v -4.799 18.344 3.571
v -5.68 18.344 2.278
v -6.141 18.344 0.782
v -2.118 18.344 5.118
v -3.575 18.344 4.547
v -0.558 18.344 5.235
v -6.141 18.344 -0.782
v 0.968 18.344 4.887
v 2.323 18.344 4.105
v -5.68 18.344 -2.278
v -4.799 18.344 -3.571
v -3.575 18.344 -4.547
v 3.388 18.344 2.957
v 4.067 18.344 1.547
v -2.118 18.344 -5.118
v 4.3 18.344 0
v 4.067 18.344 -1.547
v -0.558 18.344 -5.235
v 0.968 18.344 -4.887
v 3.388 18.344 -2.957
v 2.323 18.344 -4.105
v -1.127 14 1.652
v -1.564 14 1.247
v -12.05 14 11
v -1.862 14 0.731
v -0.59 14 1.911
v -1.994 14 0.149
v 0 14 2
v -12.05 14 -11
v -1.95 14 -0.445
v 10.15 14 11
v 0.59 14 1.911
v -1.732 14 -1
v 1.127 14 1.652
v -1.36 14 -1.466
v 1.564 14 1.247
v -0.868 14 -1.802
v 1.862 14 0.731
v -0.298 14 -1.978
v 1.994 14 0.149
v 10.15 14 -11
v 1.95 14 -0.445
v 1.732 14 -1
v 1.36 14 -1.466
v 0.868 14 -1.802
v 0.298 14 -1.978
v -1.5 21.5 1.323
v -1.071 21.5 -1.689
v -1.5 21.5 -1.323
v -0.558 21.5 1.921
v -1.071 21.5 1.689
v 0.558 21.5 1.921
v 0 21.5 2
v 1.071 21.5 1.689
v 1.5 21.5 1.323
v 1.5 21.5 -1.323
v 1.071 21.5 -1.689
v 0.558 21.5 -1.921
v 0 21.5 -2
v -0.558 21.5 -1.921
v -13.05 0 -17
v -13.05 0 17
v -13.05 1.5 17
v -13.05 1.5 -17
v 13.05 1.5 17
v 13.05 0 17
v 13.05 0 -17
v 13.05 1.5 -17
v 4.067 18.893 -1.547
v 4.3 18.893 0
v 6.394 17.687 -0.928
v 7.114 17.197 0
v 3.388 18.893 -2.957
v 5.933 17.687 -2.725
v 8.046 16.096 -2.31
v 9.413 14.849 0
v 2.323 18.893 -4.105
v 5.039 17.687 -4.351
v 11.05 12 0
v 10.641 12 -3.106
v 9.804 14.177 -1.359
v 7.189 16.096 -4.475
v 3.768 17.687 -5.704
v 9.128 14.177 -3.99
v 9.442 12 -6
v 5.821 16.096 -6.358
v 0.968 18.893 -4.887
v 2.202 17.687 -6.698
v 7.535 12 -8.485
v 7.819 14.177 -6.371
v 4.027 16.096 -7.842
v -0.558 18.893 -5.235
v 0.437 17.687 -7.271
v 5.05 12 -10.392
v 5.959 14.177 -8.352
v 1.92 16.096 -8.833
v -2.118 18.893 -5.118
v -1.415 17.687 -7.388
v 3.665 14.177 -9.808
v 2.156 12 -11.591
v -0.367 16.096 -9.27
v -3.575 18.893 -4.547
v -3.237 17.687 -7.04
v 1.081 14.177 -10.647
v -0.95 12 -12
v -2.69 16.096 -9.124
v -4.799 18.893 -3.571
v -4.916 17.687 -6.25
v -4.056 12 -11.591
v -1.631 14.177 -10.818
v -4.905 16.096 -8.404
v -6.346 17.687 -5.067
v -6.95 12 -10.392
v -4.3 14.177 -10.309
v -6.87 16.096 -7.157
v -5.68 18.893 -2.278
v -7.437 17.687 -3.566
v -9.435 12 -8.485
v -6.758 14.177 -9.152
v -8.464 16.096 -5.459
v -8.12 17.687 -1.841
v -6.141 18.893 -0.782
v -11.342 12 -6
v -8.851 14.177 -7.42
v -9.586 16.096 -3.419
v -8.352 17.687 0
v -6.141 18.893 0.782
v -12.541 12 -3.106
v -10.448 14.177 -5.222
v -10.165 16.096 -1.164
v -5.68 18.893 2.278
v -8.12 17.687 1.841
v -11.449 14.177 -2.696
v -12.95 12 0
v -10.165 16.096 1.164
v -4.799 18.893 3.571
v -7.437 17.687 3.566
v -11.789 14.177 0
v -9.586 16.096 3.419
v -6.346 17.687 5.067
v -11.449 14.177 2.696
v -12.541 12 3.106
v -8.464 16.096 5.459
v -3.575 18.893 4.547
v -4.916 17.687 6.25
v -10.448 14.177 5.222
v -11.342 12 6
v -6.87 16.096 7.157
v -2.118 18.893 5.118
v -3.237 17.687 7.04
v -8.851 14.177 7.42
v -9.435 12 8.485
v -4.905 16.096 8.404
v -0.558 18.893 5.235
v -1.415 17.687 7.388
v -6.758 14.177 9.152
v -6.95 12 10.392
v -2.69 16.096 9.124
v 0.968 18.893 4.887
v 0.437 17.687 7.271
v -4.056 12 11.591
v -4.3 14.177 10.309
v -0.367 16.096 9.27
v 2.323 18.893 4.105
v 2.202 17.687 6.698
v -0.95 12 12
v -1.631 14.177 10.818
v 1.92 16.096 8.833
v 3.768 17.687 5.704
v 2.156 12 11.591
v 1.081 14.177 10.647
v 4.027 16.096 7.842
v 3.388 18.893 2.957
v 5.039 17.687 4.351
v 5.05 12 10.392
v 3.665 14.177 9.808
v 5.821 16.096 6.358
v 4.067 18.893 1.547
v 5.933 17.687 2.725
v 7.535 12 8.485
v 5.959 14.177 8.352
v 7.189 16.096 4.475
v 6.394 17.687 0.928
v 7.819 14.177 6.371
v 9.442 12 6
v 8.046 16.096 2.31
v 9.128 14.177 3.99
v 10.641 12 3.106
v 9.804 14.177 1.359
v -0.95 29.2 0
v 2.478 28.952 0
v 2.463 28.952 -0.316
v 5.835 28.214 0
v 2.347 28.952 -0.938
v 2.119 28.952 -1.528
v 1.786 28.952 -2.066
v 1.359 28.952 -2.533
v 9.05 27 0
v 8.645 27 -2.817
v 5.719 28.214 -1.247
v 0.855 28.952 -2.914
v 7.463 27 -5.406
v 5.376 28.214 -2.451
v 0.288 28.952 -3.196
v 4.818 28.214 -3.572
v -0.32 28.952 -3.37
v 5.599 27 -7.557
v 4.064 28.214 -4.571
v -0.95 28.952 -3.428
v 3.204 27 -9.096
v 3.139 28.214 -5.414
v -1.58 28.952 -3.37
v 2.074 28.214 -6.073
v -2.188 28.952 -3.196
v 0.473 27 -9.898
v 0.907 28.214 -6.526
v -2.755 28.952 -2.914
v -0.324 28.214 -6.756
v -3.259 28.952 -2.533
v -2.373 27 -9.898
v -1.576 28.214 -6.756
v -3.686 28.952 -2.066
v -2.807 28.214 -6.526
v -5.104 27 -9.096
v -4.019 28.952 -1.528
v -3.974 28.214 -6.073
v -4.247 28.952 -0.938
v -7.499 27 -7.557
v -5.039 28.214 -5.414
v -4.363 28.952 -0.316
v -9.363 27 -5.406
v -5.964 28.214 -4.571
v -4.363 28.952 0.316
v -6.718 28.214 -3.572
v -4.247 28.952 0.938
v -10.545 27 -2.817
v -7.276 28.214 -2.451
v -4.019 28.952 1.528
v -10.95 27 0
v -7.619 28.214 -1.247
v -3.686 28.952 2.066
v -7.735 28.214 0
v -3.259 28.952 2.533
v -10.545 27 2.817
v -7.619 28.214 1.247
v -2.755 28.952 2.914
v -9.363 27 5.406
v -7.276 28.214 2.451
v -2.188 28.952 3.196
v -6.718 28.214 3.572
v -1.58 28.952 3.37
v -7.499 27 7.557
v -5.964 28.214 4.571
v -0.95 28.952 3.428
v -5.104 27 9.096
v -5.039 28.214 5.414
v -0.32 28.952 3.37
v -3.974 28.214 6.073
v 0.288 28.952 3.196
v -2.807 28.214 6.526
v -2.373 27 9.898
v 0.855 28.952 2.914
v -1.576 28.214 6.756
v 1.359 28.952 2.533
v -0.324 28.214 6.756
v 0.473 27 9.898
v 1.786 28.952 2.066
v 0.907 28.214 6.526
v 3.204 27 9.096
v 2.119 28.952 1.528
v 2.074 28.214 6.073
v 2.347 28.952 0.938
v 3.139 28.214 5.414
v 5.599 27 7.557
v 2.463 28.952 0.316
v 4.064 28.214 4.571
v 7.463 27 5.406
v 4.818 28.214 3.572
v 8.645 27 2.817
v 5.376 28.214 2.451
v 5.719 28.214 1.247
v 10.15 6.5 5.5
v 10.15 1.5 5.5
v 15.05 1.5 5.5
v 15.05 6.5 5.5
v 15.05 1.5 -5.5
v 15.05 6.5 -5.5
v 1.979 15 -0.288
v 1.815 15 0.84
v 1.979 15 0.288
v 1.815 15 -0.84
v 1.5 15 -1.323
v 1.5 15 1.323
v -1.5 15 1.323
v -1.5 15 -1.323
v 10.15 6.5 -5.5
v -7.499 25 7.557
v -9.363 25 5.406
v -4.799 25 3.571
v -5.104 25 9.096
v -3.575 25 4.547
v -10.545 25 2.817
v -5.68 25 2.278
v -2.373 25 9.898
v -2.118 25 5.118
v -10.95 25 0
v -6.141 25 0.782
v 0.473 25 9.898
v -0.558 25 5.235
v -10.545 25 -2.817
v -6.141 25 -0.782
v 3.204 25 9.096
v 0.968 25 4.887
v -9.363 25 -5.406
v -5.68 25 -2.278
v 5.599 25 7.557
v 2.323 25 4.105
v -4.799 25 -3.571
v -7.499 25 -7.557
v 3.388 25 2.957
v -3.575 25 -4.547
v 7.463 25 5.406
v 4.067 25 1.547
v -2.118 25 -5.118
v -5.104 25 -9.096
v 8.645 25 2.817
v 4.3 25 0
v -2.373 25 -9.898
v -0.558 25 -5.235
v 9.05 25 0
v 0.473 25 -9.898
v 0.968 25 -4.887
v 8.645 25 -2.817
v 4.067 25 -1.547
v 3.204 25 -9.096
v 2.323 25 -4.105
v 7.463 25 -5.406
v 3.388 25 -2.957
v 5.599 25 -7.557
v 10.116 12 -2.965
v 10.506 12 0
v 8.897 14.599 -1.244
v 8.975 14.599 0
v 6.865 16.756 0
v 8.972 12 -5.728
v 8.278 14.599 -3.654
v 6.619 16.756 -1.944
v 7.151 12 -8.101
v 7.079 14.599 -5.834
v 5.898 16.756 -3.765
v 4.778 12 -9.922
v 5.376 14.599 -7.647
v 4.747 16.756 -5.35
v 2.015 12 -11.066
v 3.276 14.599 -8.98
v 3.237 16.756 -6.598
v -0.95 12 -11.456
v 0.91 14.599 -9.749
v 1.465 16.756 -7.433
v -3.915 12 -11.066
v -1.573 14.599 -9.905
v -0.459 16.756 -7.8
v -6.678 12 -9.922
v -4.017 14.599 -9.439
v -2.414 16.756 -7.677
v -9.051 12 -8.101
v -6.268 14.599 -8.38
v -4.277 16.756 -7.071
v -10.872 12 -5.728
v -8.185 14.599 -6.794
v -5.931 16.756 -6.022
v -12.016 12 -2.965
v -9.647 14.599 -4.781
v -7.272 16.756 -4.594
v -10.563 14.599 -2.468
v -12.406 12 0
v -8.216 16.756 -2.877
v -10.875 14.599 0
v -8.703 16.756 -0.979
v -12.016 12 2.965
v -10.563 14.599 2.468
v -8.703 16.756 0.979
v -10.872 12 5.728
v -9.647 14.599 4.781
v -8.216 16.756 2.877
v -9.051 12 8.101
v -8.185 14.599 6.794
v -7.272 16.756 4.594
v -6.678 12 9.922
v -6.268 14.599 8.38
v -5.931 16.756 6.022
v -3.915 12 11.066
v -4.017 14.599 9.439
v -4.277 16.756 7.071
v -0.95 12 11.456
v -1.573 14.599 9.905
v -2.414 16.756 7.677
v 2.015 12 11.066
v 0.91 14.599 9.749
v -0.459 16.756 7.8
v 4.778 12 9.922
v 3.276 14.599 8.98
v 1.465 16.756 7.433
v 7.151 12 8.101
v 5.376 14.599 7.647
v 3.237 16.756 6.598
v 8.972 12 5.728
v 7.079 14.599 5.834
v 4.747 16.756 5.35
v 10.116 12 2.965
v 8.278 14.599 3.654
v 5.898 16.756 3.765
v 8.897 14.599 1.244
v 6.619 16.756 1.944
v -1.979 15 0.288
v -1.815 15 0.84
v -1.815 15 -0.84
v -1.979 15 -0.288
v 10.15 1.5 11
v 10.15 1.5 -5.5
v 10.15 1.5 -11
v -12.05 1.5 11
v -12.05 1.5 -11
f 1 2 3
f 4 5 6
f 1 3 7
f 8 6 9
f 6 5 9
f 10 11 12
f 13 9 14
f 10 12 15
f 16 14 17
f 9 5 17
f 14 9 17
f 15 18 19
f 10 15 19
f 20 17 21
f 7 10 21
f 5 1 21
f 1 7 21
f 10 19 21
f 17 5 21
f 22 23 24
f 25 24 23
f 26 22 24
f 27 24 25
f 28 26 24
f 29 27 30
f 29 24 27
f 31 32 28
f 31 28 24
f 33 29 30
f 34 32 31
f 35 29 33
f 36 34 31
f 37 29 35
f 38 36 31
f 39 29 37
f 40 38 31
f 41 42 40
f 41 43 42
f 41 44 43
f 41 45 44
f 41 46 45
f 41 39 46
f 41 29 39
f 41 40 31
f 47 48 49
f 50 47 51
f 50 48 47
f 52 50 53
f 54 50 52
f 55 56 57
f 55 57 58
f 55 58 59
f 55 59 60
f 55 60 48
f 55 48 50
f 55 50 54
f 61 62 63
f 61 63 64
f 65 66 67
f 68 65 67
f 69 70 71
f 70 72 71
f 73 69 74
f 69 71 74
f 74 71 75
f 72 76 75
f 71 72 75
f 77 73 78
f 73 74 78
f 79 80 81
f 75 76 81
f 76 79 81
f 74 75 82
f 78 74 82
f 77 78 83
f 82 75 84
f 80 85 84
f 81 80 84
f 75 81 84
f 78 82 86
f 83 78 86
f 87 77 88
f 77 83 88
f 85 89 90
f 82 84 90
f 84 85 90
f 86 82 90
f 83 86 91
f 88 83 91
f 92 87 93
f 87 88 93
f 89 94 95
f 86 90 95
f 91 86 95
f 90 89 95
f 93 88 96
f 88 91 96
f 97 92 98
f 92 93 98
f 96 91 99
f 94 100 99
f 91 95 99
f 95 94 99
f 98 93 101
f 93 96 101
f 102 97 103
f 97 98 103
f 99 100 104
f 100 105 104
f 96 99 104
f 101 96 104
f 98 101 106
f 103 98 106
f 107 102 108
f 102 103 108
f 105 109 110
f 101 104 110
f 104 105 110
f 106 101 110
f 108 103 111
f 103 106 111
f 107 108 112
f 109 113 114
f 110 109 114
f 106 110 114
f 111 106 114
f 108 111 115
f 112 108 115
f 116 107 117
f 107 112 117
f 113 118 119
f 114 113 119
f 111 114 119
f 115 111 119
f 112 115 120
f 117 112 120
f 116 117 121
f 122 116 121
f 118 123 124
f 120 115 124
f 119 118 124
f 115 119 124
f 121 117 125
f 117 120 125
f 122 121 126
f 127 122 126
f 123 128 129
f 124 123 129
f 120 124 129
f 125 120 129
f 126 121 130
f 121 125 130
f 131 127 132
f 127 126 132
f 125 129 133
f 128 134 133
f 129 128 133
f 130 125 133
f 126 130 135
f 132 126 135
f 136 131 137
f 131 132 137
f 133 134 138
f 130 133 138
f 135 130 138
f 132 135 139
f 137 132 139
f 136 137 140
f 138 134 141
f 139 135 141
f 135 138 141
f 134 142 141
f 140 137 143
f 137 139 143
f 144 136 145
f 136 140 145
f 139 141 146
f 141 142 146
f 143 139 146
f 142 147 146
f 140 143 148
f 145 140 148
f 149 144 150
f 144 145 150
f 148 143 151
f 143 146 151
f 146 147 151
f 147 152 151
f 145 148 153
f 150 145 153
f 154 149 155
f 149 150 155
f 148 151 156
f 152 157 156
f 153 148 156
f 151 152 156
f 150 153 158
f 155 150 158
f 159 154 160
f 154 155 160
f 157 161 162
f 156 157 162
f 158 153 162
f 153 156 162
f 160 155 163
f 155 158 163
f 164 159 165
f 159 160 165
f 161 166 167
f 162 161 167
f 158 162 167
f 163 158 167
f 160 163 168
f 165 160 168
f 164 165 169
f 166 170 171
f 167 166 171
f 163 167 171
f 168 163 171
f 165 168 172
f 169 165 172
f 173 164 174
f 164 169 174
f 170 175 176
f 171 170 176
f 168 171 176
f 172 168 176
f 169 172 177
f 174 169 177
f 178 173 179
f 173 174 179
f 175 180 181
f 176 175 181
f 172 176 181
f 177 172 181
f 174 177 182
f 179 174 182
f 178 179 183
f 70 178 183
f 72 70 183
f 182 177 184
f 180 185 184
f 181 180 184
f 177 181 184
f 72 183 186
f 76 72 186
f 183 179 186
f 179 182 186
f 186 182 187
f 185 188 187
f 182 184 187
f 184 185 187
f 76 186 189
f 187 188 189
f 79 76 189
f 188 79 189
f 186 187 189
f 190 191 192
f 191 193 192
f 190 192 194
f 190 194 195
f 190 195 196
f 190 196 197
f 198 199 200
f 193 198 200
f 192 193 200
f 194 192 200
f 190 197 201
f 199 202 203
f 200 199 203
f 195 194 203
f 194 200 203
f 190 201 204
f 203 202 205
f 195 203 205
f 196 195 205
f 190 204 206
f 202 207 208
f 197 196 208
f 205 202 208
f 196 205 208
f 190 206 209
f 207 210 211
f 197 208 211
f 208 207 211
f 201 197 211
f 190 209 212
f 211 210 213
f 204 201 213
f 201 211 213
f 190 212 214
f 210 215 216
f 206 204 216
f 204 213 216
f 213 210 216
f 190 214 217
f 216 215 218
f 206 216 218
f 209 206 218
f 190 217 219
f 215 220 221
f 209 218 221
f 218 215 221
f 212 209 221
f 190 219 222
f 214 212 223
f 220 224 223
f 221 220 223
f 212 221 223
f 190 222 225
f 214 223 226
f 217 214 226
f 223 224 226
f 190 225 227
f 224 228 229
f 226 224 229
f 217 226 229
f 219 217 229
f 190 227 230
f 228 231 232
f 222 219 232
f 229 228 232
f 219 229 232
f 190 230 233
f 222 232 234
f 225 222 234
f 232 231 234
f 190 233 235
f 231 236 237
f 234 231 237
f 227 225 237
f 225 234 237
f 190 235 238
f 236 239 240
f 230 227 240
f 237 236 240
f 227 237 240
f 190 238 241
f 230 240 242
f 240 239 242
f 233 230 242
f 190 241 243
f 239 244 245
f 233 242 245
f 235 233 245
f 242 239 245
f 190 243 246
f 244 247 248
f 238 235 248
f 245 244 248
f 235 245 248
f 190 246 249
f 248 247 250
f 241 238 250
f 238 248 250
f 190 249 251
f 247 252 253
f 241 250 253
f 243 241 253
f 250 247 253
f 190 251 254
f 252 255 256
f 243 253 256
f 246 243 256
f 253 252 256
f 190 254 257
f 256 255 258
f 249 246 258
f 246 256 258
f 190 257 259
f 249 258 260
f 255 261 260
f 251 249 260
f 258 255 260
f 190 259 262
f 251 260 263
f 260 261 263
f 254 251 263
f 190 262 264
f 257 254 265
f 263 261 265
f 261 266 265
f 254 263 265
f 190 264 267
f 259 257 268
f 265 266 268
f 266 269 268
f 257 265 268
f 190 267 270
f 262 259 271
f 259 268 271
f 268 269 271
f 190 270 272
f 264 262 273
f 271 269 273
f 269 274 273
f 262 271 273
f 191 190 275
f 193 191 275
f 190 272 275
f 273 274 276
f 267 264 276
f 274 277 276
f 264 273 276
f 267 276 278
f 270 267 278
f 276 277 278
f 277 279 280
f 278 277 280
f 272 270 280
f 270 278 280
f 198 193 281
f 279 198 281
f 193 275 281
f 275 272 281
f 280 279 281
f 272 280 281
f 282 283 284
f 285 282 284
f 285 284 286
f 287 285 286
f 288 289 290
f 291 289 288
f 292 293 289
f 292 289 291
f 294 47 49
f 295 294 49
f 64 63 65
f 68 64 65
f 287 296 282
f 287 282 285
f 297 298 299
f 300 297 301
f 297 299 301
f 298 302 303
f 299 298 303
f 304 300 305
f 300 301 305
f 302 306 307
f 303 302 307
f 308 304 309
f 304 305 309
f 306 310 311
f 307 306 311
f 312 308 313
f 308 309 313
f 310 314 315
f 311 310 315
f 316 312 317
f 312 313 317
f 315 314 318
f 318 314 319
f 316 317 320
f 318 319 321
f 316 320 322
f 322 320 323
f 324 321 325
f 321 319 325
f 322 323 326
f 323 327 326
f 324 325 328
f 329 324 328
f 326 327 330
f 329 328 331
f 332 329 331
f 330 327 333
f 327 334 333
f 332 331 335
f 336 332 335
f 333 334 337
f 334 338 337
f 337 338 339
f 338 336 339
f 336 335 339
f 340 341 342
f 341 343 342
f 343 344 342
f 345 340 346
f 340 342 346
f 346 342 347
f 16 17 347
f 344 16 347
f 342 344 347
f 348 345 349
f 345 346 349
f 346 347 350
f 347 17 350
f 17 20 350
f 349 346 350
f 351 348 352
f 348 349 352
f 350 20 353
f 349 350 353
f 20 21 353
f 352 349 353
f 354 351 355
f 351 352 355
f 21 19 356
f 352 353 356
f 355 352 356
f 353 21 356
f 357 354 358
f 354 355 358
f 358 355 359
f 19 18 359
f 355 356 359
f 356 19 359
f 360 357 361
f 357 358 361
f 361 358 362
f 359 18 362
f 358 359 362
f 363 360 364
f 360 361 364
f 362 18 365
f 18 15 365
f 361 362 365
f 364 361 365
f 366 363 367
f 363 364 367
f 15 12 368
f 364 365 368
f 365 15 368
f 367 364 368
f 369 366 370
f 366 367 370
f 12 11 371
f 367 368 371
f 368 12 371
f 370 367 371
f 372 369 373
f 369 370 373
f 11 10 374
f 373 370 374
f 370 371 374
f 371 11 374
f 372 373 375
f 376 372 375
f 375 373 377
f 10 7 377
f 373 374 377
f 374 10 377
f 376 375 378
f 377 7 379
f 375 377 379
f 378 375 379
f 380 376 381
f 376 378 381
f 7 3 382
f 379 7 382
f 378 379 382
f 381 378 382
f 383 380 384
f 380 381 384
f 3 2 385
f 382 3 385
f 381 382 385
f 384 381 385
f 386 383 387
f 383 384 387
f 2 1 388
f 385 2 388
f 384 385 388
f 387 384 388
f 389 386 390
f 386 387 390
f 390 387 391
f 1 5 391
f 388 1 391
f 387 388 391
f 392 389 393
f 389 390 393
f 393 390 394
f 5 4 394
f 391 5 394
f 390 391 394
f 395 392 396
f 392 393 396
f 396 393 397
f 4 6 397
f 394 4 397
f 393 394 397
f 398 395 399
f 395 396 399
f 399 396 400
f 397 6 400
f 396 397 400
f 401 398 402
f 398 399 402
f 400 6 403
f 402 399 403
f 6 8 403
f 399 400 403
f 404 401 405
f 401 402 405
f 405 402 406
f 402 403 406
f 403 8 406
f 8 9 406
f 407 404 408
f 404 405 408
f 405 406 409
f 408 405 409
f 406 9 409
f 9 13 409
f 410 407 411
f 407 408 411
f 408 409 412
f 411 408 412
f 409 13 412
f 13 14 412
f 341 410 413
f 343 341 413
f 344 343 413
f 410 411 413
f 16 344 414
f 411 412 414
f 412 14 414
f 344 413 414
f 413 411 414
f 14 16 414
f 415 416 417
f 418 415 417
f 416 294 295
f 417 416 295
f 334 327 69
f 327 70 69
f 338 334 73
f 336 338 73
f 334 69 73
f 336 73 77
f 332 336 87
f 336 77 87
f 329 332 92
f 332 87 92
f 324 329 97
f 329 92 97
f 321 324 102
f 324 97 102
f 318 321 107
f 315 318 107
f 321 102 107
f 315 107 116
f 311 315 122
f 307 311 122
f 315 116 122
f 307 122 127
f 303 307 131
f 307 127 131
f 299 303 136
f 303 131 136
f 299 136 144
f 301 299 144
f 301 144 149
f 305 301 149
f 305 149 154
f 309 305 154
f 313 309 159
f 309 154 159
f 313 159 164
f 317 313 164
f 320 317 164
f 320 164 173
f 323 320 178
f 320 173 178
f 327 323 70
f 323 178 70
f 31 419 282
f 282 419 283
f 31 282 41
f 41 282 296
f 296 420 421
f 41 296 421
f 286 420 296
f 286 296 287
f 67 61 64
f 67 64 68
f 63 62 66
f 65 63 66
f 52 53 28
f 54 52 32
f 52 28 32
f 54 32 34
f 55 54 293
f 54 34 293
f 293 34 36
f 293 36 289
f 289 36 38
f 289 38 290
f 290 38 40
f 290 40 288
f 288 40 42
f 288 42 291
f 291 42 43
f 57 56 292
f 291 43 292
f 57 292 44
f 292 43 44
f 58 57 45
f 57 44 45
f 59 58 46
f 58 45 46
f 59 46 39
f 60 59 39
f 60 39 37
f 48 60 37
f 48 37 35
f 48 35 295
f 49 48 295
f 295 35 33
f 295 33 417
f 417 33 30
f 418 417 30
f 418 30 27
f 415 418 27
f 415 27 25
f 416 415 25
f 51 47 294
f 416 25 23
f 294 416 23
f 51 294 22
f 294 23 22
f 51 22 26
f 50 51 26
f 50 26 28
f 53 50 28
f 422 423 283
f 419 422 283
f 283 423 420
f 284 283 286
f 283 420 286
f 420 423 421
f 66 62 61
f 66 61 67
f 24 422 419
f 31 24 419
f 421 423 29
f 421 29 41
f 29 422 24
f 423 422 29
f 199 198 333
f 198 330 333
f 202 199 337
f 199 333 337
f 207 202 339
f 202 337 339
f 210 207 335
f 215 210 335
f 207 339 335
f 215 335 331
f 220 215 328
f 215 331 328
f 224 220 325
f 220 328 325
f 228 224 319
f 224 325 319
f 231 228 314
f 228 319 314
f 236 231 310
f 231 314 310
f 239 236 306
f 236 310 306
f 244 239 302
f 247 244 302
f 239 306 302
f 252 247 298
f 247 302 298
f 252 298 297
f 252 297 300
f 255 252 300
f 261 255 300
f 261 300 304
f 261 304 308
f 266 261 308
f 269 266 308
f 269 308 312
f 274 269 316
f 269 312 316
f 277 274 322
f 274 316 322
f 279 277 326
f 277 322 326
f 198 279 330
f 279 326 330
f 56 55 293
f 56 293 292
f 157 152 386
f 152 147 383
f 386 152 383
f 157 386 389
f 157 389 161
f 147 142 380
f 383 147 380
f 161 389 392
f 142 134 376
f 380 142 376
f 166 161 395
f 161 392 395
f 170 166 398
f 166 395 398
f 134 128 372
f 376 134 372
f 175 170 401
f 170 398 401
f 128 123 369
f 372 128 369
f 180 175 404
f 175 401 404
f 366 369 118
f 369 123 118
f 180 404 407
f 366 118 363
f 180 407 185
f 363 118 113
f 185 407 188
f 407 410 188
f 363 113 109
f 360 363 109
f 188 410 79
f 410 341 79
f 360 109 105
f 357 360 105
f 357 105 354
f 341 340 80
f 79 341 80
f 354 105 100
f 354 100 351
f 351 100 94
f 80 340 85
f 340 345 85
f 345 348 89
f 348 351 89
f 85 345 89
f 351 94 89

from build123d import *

# Parameters (mm, degrees)
SKETCH1_W           = 26.1
SKETCH1_H           = 34
BOSS_EXTRUDE1_DEPTH = 1.5
SKETCH2_W           = 22.2
SKETCH2_H           = 22
BOSS_EXTRUDE2_DEPTH = 12.5
SKETCH3_W           = 4.9
SKETCH3_H           = 11
BOSS_EXTRUDE3_DEPTH = 5
SKETCH4_R           = 2
BOSS_EXTRUDE4_DEPTH = 7.5
SKETCH5_W           = 0.5
SKETCH5_H           = 2.645751312
CUT_EXTRUDE1_DEPTH  = 6.5


with BuildPart() as part:
    # Sketch1 → Boss-Extrude1 (new body)
    with BuildSketch(Plane(origin=(0, 0, 0), x_dir=(1, 0, 0), z_dir=(0, 1, 0))):
        Rectangle(SKETCH1_W, SKETCH1_H)
    extrude(amount=BOSS_EXTRUDE1_DEPTH)


with BuildPart() as body_2:
    # Sketch2 → Boss-Extrude2 (new body)
    with BuildSketch(Plane(origin=(0, 1.5, 0), x_dir=(1, 0, 0), z_dir=(0, 1, 0))):
        with Locations((-0.95, 0)):
            Rectangle(SKETCH2_W, SKETCH2_H)
    extrude(amount=BOSS_EXTRUDE2_DEPTH)

    # Sketch3 → Boss-Extrude3 (add)
    with BuildSketch(Plane(origin=(0, 1.5, 0), x_dir=(1, 0, 0), z_dir=(0, 1, 0))):
        with Locations((12.6, 0)):
            Rectangle(SKETCH3_W, SKETCH3_H)
    extrude(amount=BOSS_EXTRUDE3_DEPTH)

    # Sketch4 → Boss-Extrude4 (add)
    with BuildSketch(Plane(origin=(0, 14, 0), x_dir=(1, 0, 0), z_dir=(0, 1, 0))):
        with Locations(Location((0, 0, 0), (0, 0, 270))):
            Circle(SKETCH4_R)
    extrude(amount=BOSS_EXTRUDE4_DEPTH)

    # Sketch5 → Cut-Extrude1 (cut)
    with BuildSketch(Plane(origin=(0, 21.5, 0), x_dir=(1, 0, 0), z_dir=(0, 1, 0))):
        with Locations((1.75, 0)):
            Rectangle(SKETCH5_W, SKETCH5_H)
    cut_extrude1 = extrude(amount=-CUT_EXTRUDE1_DEPTH, mode=Mode.SUBTRACT)

    # Mirror1: Cut-Extrude1 across plane
    add(cut_extrude1.mirror(Plane(origin=(0, 0, 0), x_dir=(0, 0, 1), z_dir=(1, 0, 0))), mode=Mode.SUBTRACT)


with BuildPart() as body_3:
    # Sketch9 → Revolve1 (revolve)
    with BuildSketch(Plane.XY):
        with BuildLine():
            Line((-0.95, 18.344051305), (-0.95, 29.2))
            ThreePointArc((-0.95, 29.2), (4.169570294, 28.643501338), (9.05, 27))
            Line((9.05, 27), (9.05, 25))
            Line((9.05, 25), (4.3, 25))
            Line((4.3, 25), (4.3, 18.892749892))
            ThreePointArc((4.3, 18.892749892), (8.338063591, 16.09570639), (11.05, 12))
            Line((11.05, 12), (10.506439237, 12))
            ThreePointArc((10.506439237, 12), (7.98521263, 15.741394355), (4.3, 18.344051305))
            Line((4.3, 18.344051305), (-0.95, 18.344051305))
        make_face()
    revolve(axis=Axis((-0.95, -961.886040234, 0), (0, 1, 0)))


solid = Compound([part.part, body_2.part, body_3.part])
